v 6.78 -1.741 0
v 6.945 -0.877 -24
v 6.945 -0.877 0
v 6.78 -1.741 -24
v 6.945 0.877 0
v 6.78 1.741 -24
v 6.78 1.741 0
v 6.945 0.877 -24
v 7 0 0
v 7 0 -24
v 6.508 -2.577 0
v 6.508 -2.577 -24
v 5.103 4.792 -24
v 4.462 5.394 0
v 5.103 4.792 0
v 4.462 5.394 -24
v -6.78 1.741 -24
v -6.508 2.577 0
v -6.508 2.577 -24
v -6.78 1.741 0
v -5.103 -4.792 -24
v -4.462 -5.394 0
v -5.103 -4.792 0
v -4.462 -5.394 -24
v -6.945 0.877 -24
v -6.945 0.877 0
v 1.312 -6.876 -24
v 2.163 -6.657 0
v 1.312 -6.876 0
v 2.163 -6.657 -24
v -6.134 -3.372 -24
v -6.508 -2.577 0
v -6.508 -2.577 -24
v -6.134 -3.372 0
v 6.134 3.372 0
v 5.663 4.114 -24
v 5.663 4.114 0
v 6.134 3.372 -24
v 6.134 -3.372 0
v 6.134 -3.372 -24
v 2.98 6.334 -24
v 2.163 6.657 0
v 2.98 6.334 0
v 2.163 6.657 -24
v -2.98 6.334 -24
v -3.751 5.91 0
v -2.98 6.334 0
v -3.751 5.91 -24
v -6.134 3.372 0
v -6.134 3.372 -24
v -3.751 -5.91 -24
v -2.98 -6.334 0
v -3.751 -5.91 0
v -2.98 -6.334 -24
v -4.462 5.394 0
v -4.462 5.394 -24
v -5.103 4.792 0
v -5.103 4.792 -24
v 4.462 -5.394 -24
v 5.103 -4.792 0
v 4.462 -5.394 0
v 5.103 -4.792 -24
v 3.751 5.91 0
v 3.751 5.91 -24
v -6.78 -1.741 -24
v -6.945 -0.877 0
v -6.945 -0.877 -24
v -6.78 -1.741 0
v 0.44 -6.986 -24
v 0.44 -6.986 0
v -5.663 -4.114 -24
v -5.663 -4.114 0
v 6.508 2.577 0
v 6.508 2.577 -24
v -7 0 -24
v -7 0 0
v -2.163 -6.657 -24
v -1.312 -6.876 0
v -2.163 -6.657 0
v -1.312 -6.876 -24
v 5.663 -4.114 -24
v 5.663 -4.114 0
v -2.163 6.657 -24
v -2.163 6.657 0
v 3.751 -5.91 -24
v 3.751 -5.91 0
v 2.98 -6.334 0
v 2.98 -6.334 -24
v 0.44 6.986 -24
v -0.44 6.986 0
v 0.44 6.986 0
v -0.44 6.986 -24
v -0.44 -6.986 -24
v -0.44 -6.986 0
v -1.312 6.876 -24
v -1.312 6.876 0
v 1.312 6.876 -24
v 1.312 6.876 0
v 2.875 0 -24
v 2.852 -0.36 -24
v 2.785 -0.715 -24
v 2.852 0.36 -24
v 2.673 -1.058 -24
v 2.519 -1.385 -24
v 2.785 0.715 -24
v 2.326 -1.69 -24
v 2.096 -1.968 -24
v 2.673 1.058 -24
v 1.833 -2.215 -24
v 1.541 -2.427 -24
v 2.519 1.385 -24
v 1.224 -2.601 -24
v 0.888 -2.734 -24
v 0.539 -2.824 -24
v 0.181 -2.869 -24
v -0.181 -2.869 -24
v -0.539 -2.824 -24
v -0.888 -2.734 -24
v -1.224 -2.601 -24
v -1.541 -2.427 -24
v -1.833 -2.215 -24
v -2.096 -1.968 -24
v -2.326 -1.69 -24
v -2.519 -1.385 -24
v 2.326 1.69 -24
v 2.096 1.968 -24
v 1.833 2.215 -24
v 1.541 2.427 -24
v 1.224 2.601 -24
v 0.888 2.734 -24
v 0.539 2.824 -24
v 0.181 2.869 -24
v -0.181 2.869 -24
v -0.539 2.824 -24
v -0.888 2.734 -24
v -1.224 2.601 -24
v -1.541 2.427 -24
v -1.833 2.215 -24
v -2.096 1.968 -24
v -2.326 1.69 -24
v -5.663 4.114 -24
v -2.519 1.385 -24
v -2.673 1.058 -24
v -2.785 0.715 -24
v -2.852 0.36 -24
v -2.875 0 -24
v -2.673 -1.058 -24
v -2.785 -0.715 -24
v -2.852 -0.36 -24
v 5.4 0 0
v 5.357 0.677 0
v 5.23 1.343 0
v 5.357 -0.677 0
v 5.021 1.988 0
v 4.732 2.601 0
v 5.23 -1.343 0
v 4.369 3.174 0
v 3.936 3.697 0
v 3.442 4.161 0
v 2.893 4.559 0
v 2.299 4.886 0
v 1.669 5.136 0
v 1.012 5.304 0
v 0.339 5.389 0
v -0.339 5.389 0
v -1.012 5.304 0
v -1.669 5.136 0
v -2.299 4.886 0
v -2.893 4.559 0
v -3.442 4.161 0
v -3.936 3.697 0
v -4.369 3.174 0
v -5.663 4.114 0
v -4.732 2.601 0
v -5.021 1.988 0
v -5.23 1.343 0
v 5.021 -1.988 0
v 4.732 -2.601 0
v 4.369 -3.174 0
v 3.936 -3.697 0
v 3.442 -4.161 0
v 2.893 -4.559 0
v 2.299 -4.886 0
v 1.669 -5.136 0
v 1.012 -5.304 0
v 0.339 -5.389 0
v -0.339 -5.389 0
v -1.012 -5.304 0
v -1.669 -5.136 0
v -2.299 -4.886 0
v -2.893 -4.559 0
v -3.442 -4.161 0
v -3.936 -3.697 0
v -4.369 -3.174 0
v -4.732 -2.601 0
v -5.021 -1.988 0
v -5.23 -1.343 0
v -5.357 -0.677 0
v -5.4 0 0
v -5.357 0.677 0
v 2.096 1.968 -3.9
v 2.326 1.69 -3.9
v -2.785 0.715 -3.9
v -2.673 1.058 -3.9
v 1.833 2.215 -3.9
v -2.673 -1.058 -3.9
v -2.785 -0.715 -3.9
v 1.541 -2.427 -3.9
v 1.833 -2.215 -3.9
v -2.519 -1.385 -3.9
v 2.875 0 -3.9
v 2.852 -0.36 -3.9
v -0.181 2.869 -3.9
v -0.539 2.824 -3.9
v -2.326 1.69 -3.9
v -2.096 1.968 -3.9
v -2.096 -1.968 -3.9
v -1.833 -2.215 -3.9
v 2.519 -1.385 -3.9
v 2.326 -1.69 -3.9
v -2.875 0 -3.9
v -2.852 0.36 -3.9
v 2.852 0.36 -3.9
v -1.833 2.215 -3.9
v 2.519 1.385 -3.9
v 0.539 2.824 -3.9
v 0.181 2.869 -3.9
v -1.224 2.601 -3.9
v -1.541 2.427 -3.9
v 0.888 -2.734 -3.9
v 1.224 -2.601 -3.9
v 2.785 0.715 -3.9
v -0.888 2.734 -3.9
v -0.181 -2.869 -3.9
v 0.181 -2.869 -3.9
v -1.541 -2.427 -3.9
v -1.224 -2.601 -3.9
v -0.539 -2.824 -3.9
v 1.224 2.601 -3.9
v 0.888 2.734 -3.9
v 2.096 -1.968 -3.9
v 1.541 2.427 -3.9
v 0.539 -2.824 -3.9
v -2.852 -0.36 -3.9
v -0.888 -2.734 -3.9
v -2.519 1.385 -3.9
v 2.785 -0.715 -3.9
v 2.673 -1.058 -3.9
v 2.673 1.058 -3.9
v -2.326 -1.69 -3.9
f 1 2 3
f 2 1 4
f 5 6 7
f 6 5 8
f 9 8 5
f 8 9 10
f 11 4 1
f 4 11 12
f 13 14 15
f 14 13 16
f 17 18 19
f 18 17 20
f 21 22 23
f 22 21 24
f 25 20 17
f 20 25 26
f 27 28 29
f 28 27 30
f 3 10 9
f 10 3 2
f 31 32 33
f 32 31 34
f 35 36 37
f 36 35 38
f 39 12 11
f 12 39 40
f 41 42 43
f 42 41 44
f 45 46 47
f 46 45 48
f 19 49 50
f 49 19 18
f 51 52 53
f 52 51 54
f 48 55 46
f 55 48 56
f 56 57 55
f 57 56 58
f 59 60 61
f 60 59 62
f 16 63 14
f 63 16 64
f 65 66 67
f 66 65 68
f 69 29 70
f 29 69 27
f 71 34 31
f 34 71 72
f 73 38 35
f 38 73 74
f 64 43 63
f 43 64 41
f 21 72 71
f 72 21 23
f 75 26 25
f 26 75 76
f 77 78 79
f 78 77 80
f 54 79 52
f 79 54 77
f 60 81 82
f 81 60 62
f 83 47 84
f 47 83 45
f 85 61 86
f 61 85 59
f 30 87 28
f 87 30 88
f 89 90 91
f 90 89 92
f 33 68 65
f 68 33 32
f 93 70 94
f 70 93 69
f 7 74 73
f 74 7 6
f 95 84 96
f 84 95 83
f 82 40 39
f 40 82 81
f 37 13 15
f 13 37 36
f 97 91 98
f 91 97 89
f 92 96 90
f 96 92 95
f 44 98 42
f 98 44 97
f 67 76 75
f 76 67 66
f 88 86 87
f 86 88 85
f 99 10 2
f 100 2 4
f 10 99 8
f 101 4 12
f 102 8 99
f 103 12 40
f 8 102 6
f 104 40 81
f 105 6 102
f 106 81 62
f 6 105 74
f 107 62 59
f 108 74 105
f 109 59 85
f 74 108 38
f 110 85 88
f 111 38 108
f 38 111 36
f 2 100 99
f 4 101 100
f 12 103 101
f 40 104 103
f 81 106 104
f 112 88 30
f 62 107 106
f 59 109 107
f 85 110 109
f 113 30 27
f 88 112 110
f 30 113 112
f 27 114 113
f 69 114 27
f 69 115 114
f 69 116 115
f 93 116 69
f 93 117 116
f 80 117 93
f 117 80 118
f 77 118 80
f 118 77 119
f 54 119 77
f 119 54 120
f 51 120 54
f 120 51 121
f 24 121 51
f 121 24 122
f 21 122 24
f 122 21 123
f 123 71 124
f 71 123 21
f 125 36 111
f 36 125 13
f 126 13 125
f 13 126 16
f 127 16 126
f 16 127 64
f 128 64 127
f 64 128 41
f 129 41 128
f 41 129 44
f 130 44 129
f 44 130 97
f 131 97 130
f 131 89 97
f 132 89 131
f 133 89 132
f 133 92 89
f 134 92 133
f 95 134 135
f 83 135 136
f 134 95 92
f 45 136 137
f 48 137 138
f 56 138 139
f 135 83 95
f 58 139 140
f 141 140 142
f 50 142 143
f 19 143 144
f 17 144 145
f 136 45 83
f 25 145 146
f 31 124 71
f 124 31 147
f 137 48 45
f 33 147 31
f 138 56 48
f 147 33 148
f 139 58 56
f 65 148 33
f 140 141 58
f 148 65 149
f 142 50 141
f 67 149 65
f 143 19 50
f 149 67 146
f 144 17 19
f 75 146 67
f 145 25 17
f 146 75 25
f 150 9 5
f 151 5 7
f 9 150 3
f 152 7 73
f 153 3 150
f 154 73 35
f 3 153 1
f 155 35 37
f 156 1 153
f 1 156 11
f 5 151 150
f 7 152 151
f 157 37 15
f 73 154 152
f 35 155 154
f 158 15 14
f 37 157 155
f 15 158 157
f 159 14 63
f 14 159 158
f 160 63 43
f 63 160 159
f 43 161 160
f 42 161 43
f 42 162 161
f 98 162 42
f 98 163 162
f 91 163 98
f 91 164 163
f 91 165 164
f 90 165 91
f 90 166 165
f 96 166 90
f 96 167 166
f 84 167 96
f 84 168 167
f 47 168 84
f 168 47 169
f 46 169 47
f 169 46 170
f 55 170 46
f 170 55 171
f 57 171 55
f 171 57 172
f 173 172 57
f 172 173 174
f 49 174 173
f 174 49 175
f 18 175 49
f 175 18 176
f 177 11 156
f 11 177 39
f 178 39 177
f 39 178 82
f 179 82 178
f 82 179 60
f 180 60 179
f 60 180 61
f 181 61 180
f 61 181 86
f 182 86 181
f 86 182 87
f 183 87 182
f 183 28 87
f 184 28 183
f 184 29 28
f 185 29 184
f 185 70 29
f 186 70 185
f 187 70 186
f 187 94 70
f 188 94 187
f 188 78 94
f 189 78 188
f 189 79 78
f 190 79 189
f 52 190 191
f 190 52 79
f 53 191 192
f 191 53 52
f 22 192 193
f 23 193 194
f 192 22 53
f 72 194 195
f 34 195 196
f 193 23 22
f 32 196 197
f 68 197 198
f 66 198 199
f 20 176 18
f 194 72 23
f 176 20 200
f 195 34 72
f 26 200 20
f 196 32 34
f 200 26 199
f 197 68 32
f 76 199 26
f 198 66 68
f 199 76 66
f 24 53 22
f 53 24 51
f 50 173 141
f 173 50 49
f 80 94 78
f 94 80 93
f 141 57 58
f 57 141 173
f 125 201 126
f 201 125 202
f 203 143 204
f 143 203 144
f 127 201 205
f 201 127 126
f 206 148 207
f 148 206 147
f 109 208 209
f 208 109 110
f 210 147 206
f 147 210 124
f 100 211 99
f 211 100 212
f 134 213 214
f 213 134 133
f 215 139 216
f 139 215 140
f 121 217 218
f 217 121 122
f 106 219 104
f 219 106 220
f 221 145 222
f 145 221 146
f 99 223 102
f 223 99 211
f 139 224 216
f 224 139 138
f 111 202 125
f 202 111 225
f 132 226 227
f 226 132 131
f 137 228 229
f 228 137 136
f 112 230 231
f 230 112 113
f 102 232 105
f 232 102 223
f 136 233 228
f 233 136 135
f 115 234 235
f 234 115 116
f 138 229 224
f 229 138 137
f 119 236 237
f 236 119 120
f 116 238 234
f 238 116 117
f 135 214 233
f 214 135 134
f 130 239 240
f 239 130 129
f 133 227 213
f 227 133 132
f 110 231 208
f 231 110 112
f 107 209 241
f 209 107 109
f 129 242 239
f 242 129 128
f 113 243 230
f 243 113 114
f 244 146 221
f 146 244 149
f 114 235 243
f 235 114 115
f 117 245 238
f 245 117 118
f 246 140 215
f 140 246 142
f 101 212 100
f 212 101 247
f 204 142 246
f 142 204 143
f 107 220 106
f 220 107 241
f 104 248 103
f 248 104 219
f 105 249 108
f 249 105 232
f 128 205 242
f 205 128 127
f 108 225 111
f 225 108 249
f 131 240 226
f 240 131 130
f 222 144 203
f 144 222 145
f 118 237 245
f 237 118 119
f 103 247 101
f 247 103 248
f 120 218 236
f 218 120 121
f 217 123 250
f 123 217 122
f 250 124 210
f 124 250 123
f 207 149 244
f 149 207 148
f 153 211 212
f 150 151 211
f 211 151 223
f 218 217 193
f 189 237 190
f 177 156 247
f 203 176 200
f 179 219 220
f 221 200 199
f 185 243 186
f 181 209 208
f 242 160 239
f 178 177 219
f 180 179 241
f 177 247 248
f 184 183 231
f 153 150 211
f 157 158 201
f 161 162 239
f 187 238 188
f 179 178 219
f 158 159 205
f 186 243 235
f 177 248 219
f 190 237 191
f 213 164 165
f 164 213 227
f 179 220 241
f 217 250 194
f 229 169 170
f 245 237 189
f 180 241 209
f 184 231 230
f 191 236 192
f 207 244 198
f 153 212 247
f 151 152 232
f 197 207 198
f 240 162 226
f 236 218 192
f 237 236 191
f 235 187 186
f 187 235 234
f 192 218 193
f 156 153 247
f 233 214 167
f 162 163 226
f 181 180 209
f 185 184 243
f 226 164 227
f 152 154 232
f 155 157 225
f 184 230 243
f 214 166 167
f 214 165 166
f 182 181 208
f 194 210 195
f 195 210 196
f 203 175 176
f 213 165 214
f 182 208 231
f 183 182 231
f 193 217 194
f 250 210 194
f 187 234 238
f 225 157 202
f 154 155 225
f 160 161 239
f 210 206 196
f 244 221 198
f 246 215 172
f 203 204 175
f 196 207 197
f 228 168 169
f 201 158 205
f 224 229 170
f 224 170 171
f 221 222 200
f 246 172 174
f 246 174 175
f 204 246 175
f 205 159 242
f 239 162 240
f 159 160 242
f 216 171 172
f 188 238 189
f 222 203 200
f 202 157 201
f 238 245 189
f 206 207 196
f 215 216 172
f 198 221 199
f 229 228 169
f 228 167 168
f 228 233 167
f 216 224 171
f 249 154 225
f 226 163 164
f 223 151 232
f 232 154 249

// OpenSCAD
$fn = 50;

difference() {
	union() {
		translate(v = [0, 0, -24.0]) {
			cylinder(h = 24, r = 7.0);
		}
		#translate(v = [0, 0, -27.0]) {
			cylinder(h = 27, r = 2.875);
		}
	}
	union() {
		translate(v = [0, 0, 0]) {
			rotate(a = [0, 0, 0]) {
				difference() {
					union() {
						translate(v = [0, 0, -27.0]) {
							cylinder(h = 27, r = 2.6);
						}
						translate(v = [0, 0, -3.9]) {
							cylinder(h = 3.9, r1 = 2.875, r2 = 5.4);
						}
						translate(v = [0, 0, -27.0]) {
							cylinder(h = 27, r = 2.875);
						}
						translate(v = [0, 0, -27.0]) {
							cylinder(h = 27, r = 2.6);
						}
					}
					union();
				}
			}
		}
	}
}
